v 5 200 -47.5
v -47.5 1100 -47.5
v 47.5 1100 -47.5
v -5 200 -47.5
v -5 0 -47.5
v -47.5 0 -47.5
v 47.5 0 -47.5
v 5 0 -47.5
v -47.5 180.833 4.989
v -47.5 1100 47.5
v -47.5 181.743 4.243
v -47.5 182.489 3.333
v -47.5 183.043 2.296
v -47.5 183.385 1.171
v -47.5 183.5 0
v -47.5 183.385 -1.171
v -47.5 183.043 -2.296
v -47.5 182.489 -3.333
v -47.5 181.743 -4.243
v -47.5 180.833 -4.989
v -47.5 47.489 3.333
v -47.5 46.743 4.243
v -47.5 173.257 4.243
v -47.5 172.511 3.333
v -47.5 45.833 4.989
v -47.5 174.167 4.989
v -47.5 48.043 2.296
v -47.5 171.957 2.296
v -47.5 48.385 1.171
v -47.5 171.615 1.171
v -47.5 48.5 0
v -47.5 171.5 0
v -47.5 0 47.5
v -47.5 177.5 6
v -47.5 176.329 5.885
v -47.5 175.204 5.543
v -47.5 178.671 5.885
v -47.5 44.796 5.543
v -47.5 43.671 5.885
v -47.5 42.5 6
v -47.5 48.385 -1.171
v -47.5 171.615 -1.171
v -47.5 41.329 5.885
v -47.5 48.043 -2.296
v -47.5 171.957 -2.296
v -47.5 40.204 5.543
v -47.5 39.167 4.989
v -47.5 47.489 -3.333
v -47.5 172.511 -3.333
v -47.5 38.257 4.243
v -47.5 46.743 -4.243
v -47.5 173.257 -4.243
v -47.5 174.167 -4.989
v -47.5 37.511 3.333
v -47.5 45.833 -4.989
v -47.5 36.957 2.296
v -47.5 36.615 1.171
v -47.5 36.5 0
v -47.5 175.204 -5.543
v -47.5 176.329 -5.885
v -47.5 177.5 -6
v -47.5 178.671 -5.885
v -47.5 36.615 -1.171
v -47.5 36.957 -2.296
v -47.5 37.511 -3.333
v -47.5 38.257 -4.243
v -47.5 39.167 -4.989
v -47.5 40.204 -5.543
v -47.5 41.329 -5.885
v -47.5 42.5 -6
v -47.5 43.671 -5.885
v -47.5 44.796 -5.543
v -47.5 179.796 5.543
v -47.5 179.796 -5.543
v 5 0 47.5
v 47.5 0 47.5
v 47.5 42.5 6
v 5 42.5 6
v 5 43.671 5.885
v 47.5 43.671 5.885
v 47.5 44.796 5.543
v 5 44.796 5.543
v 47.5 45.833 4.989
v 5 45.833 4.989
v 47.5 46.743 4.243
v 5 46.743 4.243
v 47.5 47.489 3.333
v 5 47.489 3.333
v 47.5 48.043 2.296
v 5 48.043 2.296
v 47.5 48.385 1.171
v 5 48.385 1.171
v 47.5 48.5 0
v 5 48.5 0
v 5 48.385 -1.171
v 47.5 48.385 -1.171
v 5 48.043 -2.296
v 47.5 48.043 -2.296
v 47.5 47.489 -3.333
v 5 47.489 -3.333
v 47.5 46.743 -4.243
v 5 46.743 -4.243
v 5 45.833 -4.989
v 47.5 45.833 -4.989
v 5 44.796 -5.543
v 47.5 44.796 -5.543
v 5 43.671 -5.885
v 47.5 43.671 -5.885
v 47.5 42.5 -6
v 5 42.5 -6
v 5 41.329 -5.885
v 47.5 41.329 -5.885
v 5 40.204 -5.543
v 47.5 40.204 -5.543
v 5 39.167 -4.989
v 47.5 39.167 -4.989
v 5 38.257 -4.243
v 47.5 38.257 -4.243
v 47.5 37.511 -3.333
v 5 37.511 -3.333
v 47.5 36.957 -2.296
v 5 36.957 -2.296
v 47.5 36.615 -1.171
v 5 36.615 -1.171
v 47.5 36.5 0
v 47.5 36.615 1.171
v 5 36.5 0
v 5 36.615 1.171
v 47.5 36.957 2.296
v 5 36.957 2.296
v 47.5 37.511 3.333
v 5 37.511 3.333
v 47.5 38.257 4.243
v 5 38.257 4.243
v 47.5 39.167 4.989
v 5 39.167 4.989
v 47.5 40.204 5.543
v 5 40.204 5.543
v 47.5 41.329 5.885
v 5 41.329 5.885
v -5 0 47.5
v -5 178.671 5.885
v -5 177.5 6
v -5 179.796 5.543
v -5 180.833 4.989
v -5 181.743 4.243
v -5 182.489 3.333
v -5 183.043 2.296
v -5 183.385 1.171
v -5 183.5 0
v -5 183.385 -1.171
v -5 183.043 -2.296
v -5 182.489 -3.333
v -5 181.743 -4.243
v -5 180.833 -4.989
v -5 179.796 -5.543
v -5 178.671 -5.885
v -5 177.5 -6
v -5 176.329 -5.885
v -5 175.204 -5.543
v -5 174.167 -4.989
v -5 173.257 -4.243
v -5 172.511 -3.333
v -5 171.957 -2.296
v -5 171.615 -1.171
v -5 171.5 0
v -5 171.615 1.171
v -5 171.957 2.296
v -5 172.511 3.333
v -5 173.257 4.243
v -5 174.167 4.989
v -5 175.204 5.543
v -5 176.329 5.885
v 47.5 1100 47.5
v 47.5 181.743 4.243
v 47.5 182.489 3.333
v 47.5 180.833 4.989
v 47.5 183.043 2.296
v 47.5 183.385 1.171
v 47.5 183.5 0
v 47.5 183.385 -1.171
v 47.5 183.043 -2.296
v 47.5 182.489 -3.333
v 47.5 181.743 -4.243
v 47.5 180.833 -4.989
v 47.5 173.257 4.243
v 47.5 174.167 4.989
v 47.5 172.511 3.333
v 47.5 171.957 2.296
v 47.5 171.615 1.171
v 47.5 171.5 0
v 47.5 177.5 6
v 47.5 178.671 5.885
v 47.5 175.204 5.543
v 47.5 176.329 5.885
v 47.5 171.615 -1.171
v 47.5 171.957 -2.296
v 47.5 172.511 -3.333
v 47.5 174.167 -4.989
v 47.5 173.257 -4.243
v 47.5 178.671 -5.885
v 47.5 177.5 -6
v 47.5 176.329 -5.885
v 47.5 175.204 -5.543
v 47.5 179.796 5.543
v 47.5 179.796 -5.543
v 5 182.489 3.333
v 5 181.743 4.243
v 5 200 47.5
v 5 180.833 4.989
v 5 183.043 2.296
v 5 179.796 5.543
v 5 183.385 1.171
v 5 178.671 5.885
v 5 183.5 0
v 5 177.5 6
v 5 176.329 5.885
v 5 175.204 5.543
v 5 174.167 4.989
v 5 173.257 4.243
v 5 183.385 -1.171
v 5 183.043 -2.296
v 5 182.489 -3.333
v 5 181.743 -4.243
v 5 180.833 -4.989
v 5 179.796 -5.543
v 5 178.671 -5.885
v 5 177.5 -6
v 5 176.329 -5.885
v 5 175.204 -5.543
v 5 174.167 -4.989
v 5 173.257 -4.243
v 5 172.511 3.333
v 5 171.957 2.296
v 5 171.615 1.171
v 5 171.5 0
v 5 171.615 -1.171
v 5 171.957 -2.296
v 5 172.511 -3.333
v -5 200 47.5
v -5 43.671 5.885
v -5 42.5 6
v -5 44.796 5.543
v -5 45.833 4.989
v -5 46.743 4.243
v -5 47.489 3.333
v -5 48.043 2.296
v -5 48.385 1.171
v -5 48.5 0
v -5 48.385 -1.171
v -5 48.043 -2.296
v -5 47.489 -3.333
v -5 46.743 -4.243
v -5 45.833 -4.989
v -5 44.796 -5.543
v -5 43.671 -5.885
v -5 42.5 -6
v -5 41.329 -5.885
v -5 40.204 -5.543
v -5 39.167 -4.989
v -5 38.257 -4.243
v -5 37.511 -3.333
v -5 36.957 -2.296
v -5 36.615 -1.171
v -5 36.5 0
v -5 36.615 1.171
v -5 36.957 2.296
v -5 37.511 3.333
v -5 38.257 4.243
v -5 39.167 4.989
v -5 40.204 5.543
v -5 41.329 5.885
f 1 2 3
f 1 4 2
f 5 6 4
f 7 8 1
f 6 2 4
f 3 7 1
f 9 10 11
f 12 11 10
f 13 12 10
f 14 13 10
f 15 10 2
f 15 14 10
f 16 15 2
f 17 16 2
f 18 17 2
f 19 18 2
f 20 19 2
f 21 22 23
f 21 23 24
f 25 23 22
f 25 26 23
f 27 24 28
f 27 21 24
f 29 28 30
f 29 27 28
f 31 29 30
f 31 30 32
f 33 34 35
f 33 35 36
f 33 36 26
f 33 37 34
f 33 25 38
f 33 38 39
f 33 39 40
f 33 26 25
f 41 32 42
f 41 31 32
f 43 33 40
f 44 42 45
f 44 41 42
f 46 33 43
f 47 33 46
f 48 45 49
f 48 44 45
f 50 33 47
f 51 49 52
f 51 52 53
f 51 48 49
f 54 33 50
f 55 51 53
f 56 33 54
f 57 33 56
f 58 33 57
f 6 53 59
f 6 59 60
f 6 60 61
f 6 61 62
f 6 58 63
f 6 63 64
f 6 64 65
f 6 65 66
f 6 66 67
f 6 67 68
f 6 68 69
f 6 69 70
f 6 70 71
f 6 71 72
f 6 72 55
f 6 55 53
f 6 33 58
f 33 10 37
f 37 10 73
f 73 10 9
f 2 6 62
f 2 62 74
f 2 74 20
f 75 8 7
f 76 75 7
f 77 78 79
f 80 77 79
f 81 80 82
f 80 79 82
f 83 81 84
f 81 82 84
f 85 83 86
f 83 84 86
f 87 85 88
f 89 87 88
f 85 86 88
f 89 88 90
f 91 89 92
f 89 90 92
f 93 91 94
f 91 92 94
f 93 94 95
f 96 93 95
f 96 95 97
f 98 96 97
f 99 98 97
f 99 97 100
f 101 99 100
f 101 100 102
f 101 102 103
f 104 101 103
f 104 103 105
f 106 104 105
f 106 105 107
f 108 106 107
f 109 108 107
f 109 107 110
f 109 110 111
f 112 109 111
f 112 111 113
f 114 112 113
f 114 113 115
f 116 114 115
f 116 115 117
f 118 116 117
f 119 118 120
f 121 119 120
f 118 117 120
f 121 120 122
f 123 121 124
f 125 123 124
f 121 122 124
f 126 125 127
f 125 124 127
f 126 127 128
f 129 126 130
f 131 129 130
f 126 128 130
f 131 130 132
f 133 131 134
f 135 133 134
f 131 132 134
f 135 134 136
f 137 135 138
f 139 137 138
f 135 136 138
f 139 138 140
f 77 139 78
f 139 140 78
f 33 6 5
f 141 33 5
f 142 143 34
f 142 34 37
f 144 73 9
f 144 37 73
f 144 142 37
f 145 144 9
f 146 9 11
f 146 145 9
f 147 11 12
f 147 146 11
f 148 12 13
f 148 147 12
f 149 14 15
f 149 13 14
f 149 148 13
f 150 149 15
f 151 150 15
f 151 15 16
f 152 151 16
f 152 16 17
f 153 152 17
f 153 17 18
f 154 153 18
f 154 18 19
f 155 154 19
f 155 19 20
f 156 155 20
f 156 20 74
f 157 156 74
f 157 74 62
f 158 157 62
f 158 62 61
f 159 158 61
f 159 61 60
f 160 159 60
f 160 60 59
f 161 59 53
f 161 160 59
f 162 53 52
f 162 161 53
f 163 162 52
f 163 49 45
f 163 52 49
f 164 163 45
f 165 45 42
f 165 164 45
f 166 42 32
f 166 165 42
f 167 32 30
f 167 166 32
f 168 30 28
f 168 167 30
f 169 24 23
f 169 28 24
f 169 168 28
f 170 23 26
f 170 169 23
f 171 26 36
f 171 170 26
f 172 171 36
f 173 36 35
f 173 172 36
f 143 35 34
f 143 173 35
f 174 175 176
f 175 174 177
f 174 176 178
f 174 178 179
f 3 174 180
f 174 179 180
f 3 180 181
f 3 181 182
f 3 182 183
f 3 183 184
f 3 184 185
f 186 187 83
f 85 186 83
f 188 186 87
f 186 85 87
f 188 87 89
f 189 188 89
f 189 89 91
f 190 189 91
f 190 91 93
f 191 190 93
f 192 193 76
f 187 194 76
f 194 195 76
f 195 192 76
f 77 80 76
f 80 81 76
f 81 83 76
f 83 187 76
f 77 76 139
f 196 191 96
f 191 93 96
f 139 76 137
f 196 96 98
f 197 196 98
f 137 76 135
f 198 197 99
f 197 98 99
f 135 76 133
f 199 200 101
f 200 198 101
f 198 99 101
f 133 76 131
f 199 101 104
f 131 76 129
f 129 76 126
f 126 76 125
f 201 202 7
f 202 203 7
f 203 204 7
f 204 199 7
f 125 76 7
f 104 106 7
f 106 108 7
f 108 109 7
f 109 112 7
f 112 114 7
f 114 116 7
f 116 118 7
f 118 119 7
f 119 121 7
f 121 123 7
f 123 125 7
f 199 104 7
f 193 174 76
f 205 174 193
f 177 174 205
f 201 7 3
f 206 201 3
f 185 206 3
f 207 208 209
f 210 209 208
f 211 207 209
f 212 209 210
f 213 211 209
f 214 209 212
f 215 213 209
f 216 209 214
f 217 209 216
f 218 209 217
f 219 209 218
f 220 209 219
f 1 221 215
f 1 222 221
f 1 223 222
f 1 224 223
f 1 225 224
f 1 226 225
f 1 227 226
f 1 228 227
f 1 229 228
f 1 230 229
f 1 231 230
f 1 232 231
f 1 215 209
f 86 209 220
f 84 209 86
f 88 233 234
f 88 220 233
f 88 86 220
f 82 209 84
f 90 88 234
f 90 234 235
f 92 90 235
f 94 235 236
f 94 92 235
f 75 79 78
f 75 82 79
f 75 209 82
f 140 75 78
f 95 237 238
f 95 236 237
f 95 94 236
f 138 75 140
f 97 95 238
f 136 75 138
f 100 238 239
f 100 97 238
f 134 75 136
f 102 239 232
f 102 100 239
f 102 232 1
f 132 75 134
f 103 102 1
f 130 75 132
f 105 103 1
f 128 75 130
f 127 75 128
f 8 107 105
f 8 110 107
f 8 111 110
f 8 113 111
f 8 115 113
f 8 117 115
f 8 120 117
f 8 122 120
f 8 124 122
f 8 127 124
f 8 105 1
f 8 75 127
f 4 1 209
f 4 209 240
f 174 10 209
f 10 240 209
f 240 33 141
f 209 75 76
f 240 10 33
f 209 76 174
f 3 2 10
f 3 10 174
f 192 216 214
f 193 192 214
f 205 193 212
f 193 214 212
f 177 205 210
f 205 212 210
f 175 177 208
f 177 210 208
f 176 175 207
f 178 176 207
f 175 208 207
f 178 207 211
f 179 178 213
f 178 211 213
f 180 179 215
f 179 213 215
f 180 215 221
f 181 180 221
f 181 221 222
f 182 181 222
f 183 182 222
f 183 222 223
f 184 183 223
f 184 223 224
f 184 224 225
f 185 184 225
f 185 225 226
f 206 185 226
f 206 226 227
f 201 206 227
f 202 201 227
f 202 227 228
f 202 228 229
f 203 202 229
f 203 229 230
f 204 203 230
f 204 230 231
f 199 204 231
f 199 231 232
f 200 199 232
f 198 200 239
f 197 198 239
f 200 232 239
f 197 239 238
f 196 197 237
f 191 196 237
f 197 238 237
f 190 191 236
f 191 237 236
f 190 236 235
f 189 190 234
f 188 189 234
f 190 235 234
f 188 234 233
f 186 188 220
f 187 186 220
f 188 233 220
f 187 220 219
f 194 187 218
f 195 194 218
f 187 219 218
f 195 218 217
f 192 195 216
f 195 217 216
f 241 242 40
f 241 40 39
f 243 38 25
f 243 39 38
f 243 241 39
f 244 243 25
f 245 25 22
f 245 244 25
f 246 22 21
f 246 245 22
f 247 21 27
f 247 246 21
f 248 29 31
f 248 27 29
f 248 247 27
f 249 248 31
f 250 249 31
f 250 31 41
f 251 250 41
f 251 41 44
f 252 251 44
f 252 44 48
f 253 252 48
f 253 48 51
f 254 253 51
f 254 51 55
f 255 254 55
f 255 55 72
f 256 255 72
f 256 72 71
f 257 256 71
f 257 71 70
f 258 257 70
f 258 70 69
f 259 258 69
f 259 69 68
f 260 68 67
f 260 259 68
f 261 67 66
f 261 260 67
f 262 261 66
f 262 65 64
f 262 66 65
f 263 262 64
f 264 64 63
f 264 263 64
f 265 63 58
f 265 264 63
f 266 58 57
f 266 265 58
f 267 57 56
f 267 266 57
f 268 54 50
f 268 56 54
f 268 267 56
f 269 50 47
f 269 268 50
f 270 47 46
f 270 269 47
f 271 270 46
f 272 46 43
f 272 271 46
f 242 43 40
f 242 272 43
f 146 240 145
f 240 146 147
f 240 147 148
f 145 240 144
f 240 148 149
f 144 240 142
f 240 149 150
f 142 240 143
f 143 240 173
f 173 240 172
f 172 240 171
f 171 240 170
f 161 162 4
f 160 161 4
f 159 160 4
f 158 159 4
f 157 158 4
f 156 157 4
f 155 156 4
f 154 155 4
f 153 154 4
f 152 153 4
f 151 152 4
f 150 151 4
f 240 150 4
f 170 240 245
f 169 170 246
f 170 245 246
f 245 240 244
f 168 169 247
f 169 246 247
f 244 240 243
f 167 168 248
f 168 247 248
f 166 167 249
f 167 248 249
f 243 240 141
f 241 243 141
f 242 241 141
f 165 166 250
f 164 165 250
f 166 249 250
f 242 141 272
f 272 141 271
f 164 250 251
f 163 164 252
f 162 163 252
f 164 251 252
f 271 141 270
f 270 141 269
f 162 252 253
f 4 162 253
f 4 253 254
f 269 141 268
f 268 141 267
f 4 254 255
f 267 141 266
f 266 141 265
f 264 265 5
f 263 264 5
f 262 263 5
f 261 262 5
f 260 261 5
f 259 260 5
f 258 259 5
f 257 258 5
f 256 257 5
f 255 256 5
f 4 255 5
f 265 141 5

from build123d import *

# Parameters (mm, degrees)
SKETCH2_W                                   = 95
SKETCH2_H                                   = 95
EXTRUDE_H_JD_DEPTH                          = 1100
SKETCH10_W                                  = 10
SKETCH10_H                                  = 95
CUT_SLITS_F_R_STOLPFOT_DEPTH                = 200
CUT_SKRUVH_L_F_R_STOLPFOT_REACH             = 49.5
SKETCH8_R                                   = 6
CUT_SKRUVH_L_F_R_STOLPFOT_DIRECTION_2_REACH = 49.5


with BuildPart() as part:
    # Sketch2 → Extrude h_jd (new body)
    with BuildSketch(Plane(origin=(0, 0, 0), x_dir=(1, 0, 0), z_dir=(0, 1, 0))):
        Rectangle(SKETCH2_W, SKETCH2_H)
    extrude(amount=EXTRUDE_H_JD_DEPTH)

    # Sketch10 → Cut-slits f_r stolpfot (cut)
    with BuildSketch(Plane(origin=(0, 0, 0), x_dir=(-1, 0, 0), z_dir=(0, -1, 0))):
        Rectangle(SKETCH10_W, SKETCH10_H)
    extrude(amount=-CUT_SLITS_F_R_STOLPFOT_DEPTH, mode=Mode.SUBTRACT)

    # Sketch8 → Cut-skruvh_l f_r stolpfot (cut, up to next)
    with BuildSketch(Plane(origin=(0, -97.5, 0), x_dir=(0, 1, 0), z_dir=(-1, 0, 0)), mode=Mode.PRIVATE) as cut_skruvh_l_f_r_stolpfot_sk1:
        with Locations(Location((275, 0, 0), (0, 0, 270))):  # turned: the seam where the file's is
            Circle(SKETCH8_R)
    cut_skruvh_l_f_r_stolpfot_tool1 = extrude(cut_skruvh_l_f_r_stolpfot_sk1.sketch, amount=CUT_SKRUVH_L_F_R_STOLPFOT_REACH, mode=Mode.PRIVATE) & part.part
    add(cut_skruvh_l_f_r_stolpfot_tool1.solids().sort_by_distance((0, 177.5, 0))[0], mode=Mode.SUBTRACT)
    # Sketch8 → Cut-skruvh_l f_r stolpfot (cut, up to next)
    with BuildSketch(Plane(origin=(0, -97.5, 0), x_dir=(0, 1, 0), z_dir=(-1, 0, 0)), mode=Mode.PRIVATE) as cut_skruvh_l_f_r_stolpfot_sk2:
        with Locations(Location((140, 0, 0), (0, 0, 270))):  # turned: the seam where the file's is
            Circle(SKETCH8_R)
    cut_skruvh_l_f_r_stolpfot_tool2 = extrude(cut_skruvh_l_f_r_stolpfot_sk2.sketch, amount=CUT_SKRUVH_L_F_R_STOLPFOT_REACH, mode=Mode.PRIVATE) & part.part
    add(cut_skruvh_l_f_r_stolpfot_tool2.solids().sort_by_distance((0, 42.5, 0))[0], mode=Mode.SUBTRACT)

    # Sketch8 → Cut-skruvh_l f_r stolpfot direction 2 (cut, up to next)
    with BuildSketch(Plane(origin=(0, -97.5, 0), x_dir=(0, 1, 0), z_dir=(-1, 0, 0)), mode=Mode.PRIVATE) as cut_skruvh_l_f_r_stolpfot_direction_2_sk1:
        with Locations(Location((275, 0, 0), (0, 0, 270))):  # turned: the seam where the file's is
            Circle(SKETCH8_R)
    cut_skruvh_l_f_r_stolpfot_direction_2_tool1 = extrude(cut_skruvh_l_f_r_stolpfot_direction_2_sk1.sketch, amount=-CUT_SKRUVH_L_F_R_STOLPFOT_DIRECTION_2_REACH, mode=Mode.PRIVATE) & part.part
    add(cut_skruvh_l_f_r_stolpfot_direction_2_tool1.solids().sort_by_distance((0, 177.5, 0))[0], mode=Mode.SUBTRACT)
    # Sketch8 → Cut-skruvh_l f_r stolpfot direction 2 (cut, up to next)
    with BuildSketch(Plane(origin=(0, -97.5, 0), x_dir=(0, 1, 0), z_dir=(-1, 0, 0)), mode=Mode.PRIVATE) as cut_skruvh_l_f_r_stolpfot_direction_2_sk2:
        with Locations(Location((140, 0, 0), (0, 0, 270))):  # turned: the seam where the file's is
            Circle(SKETCH8_R)
    cut_skruvh_l_f_r_stolpfot_direction_2_tool2 = extrude(cut_skruvh_l_f_r_stolpfot_direction_2_sk2.sketch, amount=-CUT_SKRUVH_L_F_R_STOLPFOT_DIRECTION_2_REACH, mode=Mode.PRIVATE) & part.part
    add(cut_skruvh_l_f_r_stolpfot_direction_2_tool2.solids().sort_by_distance((0, 42.5, 0))[0], mode=Mode.SUBTRACT)


solid = part.part
